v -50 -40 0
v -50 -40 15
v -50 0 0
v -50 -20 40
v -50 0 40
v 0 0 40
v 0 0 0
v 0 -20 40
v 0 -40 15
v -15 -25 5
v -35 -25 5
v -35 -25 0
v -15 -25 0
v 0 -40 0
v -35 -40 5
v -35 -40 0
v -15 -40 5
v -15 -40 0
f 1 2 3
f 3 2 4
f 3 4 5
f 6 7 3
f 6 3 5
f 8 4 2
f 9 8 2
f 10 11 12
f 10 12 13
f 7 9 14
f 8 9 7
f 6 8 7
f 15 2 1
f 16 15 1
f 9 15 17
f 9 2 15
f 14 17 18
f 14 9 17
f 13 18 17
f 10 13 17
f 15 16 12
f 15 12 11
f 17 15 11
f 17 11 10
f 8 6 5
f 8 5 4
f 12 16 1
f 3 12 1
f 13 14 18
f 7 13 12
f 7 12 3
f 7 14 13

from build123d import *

# Parameters (mm, degrees)
F1_DEPTH = 50
F2_W     = 20
F2_H     = 5
F3_DEPTH = 15


with BuildPart() as f1:
    # F0 (on Right) → F1 (new body)
    with BuildSketch(Plane.YZ):
        Polygon((0, 40), (-20, 40), (-40, 15), (-40, 0), (0, 0), align=None)
    extrude(amount=-F1_DEPTH)

    # F2 (on face) → F3 (cut)
    with BuildSketch(Plane.XZ.offset(40)):
        with Locations((-25, 2.5)):
            Rectangle(F2_W, F2_H)
    extrude(amount=-F3_DEPTH, mode=Mode.SUBTRACT)


solid = f1.part
